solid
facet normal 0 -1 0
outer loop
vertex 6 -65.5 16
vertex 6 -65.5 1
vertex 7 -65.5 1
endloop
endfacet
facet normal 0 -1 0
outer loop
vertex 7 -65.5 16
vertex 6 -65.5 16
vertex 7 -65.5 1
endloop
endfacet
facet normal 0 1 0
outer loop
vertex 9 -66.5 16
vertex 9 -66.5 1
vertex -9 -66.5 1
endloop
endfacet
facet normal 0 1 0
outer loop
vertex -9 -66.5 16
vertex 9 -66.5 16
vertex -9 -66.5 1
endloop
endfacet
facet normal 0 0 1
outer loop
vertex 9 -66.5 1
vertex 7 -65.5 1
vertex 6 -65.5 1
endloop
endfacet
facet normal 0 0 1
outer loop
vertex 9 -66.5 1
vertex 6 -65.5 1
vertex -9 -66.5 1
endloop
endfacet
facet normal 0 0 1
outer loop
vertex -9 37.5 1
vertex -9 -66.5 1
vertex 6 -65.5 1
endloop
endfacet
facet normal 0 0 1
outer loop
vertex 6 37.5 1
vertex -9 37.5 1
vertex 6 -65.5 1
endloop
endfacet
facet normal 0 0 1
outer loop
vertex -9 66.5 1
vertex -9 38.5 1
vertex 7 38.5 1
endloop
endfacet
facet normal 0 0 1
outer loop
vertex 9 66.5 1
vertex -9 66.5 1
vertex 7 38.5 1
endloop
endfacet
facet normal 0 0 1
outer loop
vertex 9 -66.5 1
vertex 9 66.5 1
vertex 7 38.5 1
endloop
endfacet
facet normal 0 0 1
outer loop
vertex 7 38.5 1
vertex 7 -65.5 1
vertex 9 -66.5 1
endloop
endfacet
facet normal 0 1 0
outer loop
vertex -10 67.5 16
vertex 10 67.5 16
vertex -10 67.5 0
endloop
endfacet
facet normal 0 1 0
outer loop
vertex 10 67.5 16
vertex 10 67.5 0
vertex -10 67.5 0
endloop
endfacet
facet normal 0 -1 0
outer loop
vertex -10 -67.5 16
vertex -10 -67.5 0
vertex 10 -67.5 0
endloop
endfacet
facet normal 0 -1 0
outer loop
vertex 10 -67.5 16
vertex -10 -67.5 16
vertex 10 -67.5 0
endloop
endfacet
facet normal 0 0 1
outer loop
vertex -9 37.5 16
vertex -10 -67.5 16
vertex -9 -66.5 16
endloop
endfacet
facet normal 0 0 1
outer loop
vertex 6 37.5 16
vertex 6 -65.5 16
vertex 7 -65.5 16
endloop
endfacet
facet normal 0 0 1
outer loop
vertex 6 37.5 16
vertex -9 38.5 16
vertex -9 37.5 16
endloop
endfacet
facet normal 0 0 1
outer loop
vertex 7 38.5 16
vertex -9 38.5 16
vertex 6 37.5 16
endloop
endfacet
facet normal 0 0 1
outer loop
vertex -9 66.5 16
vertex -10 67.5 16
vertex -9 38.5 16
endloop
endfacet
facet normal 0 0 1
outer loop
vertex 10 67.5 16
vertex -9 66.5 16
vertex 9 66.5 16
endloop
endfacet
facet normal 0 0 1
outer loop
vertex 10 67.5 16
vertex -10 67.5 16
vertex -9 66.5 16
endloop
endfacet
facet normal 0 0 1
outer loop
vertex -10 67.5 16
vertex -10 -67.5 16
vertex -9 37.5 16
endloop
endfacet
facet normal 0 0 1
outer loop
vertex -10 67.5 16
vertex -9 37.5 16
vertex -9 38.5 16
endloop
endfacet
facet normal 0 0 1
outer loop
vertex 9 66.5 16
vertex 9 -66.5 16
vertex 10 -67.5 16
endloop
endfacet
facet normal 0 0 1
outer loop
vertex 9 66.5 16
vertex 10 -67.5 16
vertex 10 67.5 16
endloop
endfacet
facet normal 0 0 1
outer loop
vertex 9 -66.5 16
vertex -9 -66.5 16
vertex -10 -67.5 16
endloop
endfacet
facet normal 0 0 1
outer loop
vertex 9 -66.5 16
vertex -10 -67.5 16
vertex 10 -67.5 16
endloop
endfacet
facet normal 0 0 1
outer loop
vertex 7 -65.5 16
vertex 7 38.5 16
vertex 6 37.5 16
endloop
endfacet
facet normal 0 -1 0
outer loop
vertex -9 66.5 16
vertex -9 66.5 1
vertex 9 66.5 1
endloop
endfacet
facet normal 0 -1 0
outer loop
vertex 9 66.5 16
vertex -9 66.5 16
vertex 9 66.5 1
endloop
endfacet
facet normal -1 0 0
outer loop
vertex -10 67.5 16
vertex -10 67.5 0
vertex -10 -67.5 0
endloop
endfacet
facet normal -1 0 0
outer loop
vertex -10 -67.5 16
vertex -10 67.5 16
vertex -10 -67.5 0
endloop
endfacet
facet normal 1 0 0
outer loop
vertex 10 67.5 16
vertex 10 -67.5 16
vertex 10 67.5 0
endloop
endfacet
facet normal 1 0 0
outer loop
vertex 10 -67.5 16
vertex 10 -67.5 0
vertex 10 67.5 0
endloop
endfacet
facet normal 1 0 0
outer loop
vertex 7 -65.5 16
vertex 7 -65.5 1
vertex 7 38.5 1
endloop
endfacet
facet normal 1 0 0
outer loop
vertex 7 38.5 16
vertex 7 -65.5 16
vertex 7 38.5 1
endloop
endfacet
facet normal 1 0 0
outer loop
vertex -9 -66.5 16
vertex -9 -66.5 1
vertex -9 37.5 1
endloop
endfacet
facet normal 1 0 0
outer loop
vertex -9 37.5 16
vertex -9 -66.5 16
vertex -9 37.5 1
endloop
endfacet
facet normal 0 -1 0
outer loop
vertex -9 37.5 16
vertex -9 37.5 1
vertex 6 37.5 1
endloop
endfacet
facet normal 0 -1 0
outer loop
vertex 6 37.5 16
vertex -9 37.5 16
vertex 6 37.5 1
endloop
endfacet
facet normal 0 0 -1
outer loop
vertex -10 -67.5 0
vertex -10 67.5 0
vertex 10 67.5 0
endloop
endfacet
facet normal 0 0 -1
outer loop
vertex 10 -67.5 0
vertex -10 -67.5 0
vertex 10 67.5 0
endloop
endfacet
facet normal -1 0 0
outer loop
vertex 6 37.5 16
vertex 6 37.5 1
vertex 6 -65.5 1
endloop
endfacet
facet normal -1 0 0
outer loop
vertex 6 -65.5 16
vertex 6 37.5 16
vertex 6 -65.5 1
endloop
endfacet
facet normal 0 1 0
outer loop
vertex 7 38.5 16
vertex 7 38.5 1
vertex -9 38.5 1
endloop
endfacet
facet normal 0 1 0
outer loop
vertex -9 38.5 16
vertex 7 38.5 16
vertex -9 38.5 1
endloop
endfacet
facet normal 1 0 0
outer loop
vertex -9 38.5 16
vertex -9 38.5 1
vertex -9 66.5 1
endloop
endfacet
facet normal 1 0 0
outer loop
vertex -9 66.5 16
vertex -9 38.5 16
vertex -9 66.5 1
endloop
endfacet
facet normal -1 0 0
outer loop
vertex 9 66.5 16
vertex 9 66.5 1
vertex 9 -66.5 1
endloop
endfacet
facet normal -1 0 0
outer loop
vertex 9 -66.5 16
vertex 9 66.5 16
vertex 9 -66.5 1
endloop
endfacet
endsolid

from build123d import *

# Parameters (mm, degrees)
F0_W     = 20
F0_H     = 135
F1_DEPTH = 1
F2_W     = 18
F2_H     = 1
F3_DEPTH = 15


with BuildPart() as f1:
    # F0 (on Top) → F1 (new body)
    with BuildSketch(Plane.XY):
        Rectangle(F0_W, F0_H)
    extrude(amount=F1_DEPTH)

    # F2 (on face) → F3 (join)
    with BuildSketch(Plane.XY.offset(1)):
        Polygon((-10, -66.5), (-10, -67.5), (10, -67.5), (10, -66.5), (9, -66.5), (-9, -66.5), align=None)
        Polygon((-10, 67.5), (-10, -66.5), (-9, -66.5), (-9, 37.5), (-9, 38.5), (-9, 66.5), (-9, 67.5), align=None)
        Polygon((9, -66.5), (10, -66.5), (10, 67.5), (9, 67.5), (9, 66.5), align=None)
        with Locations((0, 67)):
            Rectangle(F2_W, F2_H)
        Polygon((-9, 38.5), (-9, 37.5), (6, 37.5), (6, -65.5), (7, -65.5), (7, 38.5), align=None)
    extrude(amount=F3_DEPTH)


solid = f1.part
